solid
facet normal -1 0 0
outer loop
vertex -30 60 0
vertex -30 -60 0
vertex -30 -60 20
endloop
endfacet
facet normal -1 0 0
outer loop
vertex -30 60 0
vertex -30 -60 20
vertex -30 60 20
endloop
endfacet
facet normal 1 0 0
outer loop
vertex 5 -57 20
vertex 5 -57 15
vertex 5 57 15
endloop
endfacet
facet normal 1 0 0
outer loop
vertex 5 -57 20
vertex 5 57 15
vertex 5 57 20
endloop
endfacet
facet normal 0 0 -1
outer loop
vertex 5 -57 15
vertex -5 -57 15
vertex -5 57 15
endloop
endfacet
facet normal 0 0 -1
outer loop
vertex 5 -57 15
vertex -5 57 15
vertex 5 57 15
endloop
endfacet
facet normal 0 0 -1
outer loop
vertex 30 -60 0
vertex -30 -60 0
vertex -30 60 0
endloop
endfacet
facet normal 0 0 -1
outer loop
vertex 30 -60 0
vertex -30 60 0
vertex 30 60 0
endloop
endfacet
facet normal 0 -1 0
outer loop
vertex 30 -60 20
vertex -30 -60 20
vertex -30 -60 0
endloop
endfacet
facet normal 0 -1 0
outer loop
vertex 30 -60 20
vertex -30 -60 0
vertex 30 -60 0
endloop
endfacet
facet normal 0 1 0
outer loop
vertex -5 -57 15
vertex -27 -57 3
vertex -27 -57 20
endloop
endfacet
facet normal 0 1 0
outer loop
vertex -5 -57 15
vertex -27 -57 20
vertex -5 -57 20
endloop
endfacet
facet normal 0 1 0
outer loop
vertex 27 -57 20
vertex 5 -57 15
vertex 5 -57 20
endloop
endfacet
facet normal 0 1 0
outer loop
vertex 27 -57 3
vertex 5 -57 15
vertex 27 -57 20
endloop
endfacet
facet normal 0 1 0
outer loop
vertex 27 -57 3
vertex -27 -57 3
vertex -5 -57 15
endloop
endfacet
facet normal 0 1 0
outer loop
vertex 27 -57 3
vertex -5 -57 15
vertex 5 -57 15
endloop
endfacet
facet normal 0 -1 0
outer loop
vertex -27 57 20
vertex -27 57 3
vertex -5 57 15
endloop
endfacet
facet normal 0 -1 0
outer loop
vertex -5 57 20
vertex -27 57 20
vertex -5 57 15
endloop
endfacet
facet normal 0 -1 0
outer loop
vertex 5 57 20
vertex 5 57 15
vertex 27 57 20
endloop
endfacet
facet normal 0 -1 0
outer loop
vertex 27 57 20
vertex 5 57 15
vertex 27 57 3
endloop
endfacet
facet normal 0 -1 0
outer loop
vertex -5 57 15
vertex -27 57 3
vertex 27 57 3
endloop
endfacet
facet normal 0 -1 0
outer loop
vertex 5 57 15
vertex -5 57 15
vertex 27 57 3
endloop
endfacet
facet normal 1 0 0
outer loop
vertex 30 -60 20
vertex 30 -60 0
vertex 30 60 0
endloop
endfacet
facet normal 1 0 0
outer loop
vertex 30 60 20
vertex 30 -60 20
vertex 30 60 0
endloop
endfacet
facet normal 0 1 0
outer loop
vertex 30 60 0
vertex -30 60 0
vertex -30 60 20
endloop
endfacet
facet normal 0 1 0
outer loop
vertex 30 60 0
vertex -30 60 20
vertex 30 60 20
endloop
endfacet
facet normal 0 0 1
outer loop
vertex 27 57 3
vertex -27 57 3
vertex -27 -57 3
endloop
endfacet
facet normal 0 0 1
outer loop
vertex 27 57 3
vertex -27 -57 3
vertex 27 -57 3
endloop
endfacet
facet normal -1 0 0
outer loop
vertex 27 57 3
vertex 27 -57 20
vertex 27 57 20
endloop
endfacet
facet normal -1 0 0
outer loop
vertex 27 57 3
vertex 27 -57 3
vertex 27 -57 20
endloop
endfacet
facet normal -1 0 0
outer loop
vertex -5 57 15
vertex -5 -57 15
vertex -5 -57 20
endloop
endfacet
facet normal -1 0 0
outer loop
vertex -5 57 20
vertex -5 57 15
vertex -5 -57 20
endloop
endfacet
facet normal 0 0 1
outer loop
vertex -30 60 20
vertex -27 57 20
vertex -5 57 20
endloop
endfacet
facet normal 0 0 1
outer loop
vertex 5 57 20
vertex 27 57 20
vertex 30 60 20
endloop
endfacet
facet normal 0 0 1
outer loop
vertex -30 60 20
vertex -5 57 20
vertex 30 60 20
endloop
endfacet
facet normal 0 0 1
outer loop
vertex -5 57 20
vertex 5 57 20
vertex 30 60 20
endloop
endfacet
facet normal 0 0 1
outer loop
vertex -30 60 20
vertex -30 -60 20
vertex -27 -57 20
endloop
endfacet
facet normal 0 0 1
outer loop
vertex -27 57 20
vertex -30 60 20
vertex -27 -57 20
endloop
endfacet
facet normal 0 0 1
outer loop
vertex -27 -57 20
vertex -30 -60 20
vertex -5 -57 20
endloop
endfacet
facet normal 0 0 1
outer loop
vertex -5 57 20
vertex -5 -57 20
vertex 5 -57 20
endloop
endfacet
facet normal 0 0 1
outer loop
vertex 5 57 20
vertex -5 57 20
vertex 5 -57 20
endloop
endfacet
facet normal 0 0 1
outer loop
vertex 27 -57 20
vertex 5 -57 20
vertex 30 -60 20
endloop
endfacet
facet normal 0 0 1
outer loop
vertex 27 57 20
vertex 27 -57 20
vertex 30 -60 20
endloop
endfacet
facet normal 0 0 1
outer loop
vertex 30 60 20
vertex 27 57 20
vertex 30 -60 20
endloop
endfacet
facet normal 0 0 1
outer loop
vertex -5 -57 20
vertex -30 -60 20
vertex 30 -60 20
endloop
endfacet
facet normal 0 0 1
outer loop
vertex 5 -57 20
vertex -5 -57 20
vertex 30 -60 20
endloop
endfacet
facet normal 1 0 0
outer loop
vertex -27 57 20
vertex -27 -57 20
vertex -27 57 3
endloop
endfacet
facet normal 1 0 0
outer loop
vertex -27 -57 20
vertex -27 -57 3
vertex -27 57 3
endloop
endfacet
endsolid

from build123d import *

# Parameters (mm, degrees)
F0_W     = 60
F0_H     = 120
F1_DEPTH = 20
F2_T     = -3
F3_W     = 10
F3_H     = 5
F4_DEPTH = 60
F5_DEPTH = 60


with BuildPart() as f1:
    # F0 (on Top) → F1 (new body)
    with BuildSketch(Plane.XY):
        Rectangle(F0_W, F0_H)
    extrude(amount=F1_DEPTH)

    # F2
    f2_openings = [f1.faces().sort_by_distance(p)[0] for p in [
        (0, 0, 20),
    ]]
    offset(amount=F2_T, openings=f2_openings)

    # F3 (on Front) → F4 (join)
    with BuildSketch(Plane.XZ):
        with Locations((0, 17.5)):
            Rectangle(F3_W, F3_H)
    extrude(amount=F4_DEPTH)

    # F3 (on Front) → F5 (join)
    with BuildSketch(Plane.XZ):
        with Locations((0, 17.5)):
            Rectangle(F3_W, F3_H)
    extrude(amount=-F5_DEPTH)


solid = f1.part
